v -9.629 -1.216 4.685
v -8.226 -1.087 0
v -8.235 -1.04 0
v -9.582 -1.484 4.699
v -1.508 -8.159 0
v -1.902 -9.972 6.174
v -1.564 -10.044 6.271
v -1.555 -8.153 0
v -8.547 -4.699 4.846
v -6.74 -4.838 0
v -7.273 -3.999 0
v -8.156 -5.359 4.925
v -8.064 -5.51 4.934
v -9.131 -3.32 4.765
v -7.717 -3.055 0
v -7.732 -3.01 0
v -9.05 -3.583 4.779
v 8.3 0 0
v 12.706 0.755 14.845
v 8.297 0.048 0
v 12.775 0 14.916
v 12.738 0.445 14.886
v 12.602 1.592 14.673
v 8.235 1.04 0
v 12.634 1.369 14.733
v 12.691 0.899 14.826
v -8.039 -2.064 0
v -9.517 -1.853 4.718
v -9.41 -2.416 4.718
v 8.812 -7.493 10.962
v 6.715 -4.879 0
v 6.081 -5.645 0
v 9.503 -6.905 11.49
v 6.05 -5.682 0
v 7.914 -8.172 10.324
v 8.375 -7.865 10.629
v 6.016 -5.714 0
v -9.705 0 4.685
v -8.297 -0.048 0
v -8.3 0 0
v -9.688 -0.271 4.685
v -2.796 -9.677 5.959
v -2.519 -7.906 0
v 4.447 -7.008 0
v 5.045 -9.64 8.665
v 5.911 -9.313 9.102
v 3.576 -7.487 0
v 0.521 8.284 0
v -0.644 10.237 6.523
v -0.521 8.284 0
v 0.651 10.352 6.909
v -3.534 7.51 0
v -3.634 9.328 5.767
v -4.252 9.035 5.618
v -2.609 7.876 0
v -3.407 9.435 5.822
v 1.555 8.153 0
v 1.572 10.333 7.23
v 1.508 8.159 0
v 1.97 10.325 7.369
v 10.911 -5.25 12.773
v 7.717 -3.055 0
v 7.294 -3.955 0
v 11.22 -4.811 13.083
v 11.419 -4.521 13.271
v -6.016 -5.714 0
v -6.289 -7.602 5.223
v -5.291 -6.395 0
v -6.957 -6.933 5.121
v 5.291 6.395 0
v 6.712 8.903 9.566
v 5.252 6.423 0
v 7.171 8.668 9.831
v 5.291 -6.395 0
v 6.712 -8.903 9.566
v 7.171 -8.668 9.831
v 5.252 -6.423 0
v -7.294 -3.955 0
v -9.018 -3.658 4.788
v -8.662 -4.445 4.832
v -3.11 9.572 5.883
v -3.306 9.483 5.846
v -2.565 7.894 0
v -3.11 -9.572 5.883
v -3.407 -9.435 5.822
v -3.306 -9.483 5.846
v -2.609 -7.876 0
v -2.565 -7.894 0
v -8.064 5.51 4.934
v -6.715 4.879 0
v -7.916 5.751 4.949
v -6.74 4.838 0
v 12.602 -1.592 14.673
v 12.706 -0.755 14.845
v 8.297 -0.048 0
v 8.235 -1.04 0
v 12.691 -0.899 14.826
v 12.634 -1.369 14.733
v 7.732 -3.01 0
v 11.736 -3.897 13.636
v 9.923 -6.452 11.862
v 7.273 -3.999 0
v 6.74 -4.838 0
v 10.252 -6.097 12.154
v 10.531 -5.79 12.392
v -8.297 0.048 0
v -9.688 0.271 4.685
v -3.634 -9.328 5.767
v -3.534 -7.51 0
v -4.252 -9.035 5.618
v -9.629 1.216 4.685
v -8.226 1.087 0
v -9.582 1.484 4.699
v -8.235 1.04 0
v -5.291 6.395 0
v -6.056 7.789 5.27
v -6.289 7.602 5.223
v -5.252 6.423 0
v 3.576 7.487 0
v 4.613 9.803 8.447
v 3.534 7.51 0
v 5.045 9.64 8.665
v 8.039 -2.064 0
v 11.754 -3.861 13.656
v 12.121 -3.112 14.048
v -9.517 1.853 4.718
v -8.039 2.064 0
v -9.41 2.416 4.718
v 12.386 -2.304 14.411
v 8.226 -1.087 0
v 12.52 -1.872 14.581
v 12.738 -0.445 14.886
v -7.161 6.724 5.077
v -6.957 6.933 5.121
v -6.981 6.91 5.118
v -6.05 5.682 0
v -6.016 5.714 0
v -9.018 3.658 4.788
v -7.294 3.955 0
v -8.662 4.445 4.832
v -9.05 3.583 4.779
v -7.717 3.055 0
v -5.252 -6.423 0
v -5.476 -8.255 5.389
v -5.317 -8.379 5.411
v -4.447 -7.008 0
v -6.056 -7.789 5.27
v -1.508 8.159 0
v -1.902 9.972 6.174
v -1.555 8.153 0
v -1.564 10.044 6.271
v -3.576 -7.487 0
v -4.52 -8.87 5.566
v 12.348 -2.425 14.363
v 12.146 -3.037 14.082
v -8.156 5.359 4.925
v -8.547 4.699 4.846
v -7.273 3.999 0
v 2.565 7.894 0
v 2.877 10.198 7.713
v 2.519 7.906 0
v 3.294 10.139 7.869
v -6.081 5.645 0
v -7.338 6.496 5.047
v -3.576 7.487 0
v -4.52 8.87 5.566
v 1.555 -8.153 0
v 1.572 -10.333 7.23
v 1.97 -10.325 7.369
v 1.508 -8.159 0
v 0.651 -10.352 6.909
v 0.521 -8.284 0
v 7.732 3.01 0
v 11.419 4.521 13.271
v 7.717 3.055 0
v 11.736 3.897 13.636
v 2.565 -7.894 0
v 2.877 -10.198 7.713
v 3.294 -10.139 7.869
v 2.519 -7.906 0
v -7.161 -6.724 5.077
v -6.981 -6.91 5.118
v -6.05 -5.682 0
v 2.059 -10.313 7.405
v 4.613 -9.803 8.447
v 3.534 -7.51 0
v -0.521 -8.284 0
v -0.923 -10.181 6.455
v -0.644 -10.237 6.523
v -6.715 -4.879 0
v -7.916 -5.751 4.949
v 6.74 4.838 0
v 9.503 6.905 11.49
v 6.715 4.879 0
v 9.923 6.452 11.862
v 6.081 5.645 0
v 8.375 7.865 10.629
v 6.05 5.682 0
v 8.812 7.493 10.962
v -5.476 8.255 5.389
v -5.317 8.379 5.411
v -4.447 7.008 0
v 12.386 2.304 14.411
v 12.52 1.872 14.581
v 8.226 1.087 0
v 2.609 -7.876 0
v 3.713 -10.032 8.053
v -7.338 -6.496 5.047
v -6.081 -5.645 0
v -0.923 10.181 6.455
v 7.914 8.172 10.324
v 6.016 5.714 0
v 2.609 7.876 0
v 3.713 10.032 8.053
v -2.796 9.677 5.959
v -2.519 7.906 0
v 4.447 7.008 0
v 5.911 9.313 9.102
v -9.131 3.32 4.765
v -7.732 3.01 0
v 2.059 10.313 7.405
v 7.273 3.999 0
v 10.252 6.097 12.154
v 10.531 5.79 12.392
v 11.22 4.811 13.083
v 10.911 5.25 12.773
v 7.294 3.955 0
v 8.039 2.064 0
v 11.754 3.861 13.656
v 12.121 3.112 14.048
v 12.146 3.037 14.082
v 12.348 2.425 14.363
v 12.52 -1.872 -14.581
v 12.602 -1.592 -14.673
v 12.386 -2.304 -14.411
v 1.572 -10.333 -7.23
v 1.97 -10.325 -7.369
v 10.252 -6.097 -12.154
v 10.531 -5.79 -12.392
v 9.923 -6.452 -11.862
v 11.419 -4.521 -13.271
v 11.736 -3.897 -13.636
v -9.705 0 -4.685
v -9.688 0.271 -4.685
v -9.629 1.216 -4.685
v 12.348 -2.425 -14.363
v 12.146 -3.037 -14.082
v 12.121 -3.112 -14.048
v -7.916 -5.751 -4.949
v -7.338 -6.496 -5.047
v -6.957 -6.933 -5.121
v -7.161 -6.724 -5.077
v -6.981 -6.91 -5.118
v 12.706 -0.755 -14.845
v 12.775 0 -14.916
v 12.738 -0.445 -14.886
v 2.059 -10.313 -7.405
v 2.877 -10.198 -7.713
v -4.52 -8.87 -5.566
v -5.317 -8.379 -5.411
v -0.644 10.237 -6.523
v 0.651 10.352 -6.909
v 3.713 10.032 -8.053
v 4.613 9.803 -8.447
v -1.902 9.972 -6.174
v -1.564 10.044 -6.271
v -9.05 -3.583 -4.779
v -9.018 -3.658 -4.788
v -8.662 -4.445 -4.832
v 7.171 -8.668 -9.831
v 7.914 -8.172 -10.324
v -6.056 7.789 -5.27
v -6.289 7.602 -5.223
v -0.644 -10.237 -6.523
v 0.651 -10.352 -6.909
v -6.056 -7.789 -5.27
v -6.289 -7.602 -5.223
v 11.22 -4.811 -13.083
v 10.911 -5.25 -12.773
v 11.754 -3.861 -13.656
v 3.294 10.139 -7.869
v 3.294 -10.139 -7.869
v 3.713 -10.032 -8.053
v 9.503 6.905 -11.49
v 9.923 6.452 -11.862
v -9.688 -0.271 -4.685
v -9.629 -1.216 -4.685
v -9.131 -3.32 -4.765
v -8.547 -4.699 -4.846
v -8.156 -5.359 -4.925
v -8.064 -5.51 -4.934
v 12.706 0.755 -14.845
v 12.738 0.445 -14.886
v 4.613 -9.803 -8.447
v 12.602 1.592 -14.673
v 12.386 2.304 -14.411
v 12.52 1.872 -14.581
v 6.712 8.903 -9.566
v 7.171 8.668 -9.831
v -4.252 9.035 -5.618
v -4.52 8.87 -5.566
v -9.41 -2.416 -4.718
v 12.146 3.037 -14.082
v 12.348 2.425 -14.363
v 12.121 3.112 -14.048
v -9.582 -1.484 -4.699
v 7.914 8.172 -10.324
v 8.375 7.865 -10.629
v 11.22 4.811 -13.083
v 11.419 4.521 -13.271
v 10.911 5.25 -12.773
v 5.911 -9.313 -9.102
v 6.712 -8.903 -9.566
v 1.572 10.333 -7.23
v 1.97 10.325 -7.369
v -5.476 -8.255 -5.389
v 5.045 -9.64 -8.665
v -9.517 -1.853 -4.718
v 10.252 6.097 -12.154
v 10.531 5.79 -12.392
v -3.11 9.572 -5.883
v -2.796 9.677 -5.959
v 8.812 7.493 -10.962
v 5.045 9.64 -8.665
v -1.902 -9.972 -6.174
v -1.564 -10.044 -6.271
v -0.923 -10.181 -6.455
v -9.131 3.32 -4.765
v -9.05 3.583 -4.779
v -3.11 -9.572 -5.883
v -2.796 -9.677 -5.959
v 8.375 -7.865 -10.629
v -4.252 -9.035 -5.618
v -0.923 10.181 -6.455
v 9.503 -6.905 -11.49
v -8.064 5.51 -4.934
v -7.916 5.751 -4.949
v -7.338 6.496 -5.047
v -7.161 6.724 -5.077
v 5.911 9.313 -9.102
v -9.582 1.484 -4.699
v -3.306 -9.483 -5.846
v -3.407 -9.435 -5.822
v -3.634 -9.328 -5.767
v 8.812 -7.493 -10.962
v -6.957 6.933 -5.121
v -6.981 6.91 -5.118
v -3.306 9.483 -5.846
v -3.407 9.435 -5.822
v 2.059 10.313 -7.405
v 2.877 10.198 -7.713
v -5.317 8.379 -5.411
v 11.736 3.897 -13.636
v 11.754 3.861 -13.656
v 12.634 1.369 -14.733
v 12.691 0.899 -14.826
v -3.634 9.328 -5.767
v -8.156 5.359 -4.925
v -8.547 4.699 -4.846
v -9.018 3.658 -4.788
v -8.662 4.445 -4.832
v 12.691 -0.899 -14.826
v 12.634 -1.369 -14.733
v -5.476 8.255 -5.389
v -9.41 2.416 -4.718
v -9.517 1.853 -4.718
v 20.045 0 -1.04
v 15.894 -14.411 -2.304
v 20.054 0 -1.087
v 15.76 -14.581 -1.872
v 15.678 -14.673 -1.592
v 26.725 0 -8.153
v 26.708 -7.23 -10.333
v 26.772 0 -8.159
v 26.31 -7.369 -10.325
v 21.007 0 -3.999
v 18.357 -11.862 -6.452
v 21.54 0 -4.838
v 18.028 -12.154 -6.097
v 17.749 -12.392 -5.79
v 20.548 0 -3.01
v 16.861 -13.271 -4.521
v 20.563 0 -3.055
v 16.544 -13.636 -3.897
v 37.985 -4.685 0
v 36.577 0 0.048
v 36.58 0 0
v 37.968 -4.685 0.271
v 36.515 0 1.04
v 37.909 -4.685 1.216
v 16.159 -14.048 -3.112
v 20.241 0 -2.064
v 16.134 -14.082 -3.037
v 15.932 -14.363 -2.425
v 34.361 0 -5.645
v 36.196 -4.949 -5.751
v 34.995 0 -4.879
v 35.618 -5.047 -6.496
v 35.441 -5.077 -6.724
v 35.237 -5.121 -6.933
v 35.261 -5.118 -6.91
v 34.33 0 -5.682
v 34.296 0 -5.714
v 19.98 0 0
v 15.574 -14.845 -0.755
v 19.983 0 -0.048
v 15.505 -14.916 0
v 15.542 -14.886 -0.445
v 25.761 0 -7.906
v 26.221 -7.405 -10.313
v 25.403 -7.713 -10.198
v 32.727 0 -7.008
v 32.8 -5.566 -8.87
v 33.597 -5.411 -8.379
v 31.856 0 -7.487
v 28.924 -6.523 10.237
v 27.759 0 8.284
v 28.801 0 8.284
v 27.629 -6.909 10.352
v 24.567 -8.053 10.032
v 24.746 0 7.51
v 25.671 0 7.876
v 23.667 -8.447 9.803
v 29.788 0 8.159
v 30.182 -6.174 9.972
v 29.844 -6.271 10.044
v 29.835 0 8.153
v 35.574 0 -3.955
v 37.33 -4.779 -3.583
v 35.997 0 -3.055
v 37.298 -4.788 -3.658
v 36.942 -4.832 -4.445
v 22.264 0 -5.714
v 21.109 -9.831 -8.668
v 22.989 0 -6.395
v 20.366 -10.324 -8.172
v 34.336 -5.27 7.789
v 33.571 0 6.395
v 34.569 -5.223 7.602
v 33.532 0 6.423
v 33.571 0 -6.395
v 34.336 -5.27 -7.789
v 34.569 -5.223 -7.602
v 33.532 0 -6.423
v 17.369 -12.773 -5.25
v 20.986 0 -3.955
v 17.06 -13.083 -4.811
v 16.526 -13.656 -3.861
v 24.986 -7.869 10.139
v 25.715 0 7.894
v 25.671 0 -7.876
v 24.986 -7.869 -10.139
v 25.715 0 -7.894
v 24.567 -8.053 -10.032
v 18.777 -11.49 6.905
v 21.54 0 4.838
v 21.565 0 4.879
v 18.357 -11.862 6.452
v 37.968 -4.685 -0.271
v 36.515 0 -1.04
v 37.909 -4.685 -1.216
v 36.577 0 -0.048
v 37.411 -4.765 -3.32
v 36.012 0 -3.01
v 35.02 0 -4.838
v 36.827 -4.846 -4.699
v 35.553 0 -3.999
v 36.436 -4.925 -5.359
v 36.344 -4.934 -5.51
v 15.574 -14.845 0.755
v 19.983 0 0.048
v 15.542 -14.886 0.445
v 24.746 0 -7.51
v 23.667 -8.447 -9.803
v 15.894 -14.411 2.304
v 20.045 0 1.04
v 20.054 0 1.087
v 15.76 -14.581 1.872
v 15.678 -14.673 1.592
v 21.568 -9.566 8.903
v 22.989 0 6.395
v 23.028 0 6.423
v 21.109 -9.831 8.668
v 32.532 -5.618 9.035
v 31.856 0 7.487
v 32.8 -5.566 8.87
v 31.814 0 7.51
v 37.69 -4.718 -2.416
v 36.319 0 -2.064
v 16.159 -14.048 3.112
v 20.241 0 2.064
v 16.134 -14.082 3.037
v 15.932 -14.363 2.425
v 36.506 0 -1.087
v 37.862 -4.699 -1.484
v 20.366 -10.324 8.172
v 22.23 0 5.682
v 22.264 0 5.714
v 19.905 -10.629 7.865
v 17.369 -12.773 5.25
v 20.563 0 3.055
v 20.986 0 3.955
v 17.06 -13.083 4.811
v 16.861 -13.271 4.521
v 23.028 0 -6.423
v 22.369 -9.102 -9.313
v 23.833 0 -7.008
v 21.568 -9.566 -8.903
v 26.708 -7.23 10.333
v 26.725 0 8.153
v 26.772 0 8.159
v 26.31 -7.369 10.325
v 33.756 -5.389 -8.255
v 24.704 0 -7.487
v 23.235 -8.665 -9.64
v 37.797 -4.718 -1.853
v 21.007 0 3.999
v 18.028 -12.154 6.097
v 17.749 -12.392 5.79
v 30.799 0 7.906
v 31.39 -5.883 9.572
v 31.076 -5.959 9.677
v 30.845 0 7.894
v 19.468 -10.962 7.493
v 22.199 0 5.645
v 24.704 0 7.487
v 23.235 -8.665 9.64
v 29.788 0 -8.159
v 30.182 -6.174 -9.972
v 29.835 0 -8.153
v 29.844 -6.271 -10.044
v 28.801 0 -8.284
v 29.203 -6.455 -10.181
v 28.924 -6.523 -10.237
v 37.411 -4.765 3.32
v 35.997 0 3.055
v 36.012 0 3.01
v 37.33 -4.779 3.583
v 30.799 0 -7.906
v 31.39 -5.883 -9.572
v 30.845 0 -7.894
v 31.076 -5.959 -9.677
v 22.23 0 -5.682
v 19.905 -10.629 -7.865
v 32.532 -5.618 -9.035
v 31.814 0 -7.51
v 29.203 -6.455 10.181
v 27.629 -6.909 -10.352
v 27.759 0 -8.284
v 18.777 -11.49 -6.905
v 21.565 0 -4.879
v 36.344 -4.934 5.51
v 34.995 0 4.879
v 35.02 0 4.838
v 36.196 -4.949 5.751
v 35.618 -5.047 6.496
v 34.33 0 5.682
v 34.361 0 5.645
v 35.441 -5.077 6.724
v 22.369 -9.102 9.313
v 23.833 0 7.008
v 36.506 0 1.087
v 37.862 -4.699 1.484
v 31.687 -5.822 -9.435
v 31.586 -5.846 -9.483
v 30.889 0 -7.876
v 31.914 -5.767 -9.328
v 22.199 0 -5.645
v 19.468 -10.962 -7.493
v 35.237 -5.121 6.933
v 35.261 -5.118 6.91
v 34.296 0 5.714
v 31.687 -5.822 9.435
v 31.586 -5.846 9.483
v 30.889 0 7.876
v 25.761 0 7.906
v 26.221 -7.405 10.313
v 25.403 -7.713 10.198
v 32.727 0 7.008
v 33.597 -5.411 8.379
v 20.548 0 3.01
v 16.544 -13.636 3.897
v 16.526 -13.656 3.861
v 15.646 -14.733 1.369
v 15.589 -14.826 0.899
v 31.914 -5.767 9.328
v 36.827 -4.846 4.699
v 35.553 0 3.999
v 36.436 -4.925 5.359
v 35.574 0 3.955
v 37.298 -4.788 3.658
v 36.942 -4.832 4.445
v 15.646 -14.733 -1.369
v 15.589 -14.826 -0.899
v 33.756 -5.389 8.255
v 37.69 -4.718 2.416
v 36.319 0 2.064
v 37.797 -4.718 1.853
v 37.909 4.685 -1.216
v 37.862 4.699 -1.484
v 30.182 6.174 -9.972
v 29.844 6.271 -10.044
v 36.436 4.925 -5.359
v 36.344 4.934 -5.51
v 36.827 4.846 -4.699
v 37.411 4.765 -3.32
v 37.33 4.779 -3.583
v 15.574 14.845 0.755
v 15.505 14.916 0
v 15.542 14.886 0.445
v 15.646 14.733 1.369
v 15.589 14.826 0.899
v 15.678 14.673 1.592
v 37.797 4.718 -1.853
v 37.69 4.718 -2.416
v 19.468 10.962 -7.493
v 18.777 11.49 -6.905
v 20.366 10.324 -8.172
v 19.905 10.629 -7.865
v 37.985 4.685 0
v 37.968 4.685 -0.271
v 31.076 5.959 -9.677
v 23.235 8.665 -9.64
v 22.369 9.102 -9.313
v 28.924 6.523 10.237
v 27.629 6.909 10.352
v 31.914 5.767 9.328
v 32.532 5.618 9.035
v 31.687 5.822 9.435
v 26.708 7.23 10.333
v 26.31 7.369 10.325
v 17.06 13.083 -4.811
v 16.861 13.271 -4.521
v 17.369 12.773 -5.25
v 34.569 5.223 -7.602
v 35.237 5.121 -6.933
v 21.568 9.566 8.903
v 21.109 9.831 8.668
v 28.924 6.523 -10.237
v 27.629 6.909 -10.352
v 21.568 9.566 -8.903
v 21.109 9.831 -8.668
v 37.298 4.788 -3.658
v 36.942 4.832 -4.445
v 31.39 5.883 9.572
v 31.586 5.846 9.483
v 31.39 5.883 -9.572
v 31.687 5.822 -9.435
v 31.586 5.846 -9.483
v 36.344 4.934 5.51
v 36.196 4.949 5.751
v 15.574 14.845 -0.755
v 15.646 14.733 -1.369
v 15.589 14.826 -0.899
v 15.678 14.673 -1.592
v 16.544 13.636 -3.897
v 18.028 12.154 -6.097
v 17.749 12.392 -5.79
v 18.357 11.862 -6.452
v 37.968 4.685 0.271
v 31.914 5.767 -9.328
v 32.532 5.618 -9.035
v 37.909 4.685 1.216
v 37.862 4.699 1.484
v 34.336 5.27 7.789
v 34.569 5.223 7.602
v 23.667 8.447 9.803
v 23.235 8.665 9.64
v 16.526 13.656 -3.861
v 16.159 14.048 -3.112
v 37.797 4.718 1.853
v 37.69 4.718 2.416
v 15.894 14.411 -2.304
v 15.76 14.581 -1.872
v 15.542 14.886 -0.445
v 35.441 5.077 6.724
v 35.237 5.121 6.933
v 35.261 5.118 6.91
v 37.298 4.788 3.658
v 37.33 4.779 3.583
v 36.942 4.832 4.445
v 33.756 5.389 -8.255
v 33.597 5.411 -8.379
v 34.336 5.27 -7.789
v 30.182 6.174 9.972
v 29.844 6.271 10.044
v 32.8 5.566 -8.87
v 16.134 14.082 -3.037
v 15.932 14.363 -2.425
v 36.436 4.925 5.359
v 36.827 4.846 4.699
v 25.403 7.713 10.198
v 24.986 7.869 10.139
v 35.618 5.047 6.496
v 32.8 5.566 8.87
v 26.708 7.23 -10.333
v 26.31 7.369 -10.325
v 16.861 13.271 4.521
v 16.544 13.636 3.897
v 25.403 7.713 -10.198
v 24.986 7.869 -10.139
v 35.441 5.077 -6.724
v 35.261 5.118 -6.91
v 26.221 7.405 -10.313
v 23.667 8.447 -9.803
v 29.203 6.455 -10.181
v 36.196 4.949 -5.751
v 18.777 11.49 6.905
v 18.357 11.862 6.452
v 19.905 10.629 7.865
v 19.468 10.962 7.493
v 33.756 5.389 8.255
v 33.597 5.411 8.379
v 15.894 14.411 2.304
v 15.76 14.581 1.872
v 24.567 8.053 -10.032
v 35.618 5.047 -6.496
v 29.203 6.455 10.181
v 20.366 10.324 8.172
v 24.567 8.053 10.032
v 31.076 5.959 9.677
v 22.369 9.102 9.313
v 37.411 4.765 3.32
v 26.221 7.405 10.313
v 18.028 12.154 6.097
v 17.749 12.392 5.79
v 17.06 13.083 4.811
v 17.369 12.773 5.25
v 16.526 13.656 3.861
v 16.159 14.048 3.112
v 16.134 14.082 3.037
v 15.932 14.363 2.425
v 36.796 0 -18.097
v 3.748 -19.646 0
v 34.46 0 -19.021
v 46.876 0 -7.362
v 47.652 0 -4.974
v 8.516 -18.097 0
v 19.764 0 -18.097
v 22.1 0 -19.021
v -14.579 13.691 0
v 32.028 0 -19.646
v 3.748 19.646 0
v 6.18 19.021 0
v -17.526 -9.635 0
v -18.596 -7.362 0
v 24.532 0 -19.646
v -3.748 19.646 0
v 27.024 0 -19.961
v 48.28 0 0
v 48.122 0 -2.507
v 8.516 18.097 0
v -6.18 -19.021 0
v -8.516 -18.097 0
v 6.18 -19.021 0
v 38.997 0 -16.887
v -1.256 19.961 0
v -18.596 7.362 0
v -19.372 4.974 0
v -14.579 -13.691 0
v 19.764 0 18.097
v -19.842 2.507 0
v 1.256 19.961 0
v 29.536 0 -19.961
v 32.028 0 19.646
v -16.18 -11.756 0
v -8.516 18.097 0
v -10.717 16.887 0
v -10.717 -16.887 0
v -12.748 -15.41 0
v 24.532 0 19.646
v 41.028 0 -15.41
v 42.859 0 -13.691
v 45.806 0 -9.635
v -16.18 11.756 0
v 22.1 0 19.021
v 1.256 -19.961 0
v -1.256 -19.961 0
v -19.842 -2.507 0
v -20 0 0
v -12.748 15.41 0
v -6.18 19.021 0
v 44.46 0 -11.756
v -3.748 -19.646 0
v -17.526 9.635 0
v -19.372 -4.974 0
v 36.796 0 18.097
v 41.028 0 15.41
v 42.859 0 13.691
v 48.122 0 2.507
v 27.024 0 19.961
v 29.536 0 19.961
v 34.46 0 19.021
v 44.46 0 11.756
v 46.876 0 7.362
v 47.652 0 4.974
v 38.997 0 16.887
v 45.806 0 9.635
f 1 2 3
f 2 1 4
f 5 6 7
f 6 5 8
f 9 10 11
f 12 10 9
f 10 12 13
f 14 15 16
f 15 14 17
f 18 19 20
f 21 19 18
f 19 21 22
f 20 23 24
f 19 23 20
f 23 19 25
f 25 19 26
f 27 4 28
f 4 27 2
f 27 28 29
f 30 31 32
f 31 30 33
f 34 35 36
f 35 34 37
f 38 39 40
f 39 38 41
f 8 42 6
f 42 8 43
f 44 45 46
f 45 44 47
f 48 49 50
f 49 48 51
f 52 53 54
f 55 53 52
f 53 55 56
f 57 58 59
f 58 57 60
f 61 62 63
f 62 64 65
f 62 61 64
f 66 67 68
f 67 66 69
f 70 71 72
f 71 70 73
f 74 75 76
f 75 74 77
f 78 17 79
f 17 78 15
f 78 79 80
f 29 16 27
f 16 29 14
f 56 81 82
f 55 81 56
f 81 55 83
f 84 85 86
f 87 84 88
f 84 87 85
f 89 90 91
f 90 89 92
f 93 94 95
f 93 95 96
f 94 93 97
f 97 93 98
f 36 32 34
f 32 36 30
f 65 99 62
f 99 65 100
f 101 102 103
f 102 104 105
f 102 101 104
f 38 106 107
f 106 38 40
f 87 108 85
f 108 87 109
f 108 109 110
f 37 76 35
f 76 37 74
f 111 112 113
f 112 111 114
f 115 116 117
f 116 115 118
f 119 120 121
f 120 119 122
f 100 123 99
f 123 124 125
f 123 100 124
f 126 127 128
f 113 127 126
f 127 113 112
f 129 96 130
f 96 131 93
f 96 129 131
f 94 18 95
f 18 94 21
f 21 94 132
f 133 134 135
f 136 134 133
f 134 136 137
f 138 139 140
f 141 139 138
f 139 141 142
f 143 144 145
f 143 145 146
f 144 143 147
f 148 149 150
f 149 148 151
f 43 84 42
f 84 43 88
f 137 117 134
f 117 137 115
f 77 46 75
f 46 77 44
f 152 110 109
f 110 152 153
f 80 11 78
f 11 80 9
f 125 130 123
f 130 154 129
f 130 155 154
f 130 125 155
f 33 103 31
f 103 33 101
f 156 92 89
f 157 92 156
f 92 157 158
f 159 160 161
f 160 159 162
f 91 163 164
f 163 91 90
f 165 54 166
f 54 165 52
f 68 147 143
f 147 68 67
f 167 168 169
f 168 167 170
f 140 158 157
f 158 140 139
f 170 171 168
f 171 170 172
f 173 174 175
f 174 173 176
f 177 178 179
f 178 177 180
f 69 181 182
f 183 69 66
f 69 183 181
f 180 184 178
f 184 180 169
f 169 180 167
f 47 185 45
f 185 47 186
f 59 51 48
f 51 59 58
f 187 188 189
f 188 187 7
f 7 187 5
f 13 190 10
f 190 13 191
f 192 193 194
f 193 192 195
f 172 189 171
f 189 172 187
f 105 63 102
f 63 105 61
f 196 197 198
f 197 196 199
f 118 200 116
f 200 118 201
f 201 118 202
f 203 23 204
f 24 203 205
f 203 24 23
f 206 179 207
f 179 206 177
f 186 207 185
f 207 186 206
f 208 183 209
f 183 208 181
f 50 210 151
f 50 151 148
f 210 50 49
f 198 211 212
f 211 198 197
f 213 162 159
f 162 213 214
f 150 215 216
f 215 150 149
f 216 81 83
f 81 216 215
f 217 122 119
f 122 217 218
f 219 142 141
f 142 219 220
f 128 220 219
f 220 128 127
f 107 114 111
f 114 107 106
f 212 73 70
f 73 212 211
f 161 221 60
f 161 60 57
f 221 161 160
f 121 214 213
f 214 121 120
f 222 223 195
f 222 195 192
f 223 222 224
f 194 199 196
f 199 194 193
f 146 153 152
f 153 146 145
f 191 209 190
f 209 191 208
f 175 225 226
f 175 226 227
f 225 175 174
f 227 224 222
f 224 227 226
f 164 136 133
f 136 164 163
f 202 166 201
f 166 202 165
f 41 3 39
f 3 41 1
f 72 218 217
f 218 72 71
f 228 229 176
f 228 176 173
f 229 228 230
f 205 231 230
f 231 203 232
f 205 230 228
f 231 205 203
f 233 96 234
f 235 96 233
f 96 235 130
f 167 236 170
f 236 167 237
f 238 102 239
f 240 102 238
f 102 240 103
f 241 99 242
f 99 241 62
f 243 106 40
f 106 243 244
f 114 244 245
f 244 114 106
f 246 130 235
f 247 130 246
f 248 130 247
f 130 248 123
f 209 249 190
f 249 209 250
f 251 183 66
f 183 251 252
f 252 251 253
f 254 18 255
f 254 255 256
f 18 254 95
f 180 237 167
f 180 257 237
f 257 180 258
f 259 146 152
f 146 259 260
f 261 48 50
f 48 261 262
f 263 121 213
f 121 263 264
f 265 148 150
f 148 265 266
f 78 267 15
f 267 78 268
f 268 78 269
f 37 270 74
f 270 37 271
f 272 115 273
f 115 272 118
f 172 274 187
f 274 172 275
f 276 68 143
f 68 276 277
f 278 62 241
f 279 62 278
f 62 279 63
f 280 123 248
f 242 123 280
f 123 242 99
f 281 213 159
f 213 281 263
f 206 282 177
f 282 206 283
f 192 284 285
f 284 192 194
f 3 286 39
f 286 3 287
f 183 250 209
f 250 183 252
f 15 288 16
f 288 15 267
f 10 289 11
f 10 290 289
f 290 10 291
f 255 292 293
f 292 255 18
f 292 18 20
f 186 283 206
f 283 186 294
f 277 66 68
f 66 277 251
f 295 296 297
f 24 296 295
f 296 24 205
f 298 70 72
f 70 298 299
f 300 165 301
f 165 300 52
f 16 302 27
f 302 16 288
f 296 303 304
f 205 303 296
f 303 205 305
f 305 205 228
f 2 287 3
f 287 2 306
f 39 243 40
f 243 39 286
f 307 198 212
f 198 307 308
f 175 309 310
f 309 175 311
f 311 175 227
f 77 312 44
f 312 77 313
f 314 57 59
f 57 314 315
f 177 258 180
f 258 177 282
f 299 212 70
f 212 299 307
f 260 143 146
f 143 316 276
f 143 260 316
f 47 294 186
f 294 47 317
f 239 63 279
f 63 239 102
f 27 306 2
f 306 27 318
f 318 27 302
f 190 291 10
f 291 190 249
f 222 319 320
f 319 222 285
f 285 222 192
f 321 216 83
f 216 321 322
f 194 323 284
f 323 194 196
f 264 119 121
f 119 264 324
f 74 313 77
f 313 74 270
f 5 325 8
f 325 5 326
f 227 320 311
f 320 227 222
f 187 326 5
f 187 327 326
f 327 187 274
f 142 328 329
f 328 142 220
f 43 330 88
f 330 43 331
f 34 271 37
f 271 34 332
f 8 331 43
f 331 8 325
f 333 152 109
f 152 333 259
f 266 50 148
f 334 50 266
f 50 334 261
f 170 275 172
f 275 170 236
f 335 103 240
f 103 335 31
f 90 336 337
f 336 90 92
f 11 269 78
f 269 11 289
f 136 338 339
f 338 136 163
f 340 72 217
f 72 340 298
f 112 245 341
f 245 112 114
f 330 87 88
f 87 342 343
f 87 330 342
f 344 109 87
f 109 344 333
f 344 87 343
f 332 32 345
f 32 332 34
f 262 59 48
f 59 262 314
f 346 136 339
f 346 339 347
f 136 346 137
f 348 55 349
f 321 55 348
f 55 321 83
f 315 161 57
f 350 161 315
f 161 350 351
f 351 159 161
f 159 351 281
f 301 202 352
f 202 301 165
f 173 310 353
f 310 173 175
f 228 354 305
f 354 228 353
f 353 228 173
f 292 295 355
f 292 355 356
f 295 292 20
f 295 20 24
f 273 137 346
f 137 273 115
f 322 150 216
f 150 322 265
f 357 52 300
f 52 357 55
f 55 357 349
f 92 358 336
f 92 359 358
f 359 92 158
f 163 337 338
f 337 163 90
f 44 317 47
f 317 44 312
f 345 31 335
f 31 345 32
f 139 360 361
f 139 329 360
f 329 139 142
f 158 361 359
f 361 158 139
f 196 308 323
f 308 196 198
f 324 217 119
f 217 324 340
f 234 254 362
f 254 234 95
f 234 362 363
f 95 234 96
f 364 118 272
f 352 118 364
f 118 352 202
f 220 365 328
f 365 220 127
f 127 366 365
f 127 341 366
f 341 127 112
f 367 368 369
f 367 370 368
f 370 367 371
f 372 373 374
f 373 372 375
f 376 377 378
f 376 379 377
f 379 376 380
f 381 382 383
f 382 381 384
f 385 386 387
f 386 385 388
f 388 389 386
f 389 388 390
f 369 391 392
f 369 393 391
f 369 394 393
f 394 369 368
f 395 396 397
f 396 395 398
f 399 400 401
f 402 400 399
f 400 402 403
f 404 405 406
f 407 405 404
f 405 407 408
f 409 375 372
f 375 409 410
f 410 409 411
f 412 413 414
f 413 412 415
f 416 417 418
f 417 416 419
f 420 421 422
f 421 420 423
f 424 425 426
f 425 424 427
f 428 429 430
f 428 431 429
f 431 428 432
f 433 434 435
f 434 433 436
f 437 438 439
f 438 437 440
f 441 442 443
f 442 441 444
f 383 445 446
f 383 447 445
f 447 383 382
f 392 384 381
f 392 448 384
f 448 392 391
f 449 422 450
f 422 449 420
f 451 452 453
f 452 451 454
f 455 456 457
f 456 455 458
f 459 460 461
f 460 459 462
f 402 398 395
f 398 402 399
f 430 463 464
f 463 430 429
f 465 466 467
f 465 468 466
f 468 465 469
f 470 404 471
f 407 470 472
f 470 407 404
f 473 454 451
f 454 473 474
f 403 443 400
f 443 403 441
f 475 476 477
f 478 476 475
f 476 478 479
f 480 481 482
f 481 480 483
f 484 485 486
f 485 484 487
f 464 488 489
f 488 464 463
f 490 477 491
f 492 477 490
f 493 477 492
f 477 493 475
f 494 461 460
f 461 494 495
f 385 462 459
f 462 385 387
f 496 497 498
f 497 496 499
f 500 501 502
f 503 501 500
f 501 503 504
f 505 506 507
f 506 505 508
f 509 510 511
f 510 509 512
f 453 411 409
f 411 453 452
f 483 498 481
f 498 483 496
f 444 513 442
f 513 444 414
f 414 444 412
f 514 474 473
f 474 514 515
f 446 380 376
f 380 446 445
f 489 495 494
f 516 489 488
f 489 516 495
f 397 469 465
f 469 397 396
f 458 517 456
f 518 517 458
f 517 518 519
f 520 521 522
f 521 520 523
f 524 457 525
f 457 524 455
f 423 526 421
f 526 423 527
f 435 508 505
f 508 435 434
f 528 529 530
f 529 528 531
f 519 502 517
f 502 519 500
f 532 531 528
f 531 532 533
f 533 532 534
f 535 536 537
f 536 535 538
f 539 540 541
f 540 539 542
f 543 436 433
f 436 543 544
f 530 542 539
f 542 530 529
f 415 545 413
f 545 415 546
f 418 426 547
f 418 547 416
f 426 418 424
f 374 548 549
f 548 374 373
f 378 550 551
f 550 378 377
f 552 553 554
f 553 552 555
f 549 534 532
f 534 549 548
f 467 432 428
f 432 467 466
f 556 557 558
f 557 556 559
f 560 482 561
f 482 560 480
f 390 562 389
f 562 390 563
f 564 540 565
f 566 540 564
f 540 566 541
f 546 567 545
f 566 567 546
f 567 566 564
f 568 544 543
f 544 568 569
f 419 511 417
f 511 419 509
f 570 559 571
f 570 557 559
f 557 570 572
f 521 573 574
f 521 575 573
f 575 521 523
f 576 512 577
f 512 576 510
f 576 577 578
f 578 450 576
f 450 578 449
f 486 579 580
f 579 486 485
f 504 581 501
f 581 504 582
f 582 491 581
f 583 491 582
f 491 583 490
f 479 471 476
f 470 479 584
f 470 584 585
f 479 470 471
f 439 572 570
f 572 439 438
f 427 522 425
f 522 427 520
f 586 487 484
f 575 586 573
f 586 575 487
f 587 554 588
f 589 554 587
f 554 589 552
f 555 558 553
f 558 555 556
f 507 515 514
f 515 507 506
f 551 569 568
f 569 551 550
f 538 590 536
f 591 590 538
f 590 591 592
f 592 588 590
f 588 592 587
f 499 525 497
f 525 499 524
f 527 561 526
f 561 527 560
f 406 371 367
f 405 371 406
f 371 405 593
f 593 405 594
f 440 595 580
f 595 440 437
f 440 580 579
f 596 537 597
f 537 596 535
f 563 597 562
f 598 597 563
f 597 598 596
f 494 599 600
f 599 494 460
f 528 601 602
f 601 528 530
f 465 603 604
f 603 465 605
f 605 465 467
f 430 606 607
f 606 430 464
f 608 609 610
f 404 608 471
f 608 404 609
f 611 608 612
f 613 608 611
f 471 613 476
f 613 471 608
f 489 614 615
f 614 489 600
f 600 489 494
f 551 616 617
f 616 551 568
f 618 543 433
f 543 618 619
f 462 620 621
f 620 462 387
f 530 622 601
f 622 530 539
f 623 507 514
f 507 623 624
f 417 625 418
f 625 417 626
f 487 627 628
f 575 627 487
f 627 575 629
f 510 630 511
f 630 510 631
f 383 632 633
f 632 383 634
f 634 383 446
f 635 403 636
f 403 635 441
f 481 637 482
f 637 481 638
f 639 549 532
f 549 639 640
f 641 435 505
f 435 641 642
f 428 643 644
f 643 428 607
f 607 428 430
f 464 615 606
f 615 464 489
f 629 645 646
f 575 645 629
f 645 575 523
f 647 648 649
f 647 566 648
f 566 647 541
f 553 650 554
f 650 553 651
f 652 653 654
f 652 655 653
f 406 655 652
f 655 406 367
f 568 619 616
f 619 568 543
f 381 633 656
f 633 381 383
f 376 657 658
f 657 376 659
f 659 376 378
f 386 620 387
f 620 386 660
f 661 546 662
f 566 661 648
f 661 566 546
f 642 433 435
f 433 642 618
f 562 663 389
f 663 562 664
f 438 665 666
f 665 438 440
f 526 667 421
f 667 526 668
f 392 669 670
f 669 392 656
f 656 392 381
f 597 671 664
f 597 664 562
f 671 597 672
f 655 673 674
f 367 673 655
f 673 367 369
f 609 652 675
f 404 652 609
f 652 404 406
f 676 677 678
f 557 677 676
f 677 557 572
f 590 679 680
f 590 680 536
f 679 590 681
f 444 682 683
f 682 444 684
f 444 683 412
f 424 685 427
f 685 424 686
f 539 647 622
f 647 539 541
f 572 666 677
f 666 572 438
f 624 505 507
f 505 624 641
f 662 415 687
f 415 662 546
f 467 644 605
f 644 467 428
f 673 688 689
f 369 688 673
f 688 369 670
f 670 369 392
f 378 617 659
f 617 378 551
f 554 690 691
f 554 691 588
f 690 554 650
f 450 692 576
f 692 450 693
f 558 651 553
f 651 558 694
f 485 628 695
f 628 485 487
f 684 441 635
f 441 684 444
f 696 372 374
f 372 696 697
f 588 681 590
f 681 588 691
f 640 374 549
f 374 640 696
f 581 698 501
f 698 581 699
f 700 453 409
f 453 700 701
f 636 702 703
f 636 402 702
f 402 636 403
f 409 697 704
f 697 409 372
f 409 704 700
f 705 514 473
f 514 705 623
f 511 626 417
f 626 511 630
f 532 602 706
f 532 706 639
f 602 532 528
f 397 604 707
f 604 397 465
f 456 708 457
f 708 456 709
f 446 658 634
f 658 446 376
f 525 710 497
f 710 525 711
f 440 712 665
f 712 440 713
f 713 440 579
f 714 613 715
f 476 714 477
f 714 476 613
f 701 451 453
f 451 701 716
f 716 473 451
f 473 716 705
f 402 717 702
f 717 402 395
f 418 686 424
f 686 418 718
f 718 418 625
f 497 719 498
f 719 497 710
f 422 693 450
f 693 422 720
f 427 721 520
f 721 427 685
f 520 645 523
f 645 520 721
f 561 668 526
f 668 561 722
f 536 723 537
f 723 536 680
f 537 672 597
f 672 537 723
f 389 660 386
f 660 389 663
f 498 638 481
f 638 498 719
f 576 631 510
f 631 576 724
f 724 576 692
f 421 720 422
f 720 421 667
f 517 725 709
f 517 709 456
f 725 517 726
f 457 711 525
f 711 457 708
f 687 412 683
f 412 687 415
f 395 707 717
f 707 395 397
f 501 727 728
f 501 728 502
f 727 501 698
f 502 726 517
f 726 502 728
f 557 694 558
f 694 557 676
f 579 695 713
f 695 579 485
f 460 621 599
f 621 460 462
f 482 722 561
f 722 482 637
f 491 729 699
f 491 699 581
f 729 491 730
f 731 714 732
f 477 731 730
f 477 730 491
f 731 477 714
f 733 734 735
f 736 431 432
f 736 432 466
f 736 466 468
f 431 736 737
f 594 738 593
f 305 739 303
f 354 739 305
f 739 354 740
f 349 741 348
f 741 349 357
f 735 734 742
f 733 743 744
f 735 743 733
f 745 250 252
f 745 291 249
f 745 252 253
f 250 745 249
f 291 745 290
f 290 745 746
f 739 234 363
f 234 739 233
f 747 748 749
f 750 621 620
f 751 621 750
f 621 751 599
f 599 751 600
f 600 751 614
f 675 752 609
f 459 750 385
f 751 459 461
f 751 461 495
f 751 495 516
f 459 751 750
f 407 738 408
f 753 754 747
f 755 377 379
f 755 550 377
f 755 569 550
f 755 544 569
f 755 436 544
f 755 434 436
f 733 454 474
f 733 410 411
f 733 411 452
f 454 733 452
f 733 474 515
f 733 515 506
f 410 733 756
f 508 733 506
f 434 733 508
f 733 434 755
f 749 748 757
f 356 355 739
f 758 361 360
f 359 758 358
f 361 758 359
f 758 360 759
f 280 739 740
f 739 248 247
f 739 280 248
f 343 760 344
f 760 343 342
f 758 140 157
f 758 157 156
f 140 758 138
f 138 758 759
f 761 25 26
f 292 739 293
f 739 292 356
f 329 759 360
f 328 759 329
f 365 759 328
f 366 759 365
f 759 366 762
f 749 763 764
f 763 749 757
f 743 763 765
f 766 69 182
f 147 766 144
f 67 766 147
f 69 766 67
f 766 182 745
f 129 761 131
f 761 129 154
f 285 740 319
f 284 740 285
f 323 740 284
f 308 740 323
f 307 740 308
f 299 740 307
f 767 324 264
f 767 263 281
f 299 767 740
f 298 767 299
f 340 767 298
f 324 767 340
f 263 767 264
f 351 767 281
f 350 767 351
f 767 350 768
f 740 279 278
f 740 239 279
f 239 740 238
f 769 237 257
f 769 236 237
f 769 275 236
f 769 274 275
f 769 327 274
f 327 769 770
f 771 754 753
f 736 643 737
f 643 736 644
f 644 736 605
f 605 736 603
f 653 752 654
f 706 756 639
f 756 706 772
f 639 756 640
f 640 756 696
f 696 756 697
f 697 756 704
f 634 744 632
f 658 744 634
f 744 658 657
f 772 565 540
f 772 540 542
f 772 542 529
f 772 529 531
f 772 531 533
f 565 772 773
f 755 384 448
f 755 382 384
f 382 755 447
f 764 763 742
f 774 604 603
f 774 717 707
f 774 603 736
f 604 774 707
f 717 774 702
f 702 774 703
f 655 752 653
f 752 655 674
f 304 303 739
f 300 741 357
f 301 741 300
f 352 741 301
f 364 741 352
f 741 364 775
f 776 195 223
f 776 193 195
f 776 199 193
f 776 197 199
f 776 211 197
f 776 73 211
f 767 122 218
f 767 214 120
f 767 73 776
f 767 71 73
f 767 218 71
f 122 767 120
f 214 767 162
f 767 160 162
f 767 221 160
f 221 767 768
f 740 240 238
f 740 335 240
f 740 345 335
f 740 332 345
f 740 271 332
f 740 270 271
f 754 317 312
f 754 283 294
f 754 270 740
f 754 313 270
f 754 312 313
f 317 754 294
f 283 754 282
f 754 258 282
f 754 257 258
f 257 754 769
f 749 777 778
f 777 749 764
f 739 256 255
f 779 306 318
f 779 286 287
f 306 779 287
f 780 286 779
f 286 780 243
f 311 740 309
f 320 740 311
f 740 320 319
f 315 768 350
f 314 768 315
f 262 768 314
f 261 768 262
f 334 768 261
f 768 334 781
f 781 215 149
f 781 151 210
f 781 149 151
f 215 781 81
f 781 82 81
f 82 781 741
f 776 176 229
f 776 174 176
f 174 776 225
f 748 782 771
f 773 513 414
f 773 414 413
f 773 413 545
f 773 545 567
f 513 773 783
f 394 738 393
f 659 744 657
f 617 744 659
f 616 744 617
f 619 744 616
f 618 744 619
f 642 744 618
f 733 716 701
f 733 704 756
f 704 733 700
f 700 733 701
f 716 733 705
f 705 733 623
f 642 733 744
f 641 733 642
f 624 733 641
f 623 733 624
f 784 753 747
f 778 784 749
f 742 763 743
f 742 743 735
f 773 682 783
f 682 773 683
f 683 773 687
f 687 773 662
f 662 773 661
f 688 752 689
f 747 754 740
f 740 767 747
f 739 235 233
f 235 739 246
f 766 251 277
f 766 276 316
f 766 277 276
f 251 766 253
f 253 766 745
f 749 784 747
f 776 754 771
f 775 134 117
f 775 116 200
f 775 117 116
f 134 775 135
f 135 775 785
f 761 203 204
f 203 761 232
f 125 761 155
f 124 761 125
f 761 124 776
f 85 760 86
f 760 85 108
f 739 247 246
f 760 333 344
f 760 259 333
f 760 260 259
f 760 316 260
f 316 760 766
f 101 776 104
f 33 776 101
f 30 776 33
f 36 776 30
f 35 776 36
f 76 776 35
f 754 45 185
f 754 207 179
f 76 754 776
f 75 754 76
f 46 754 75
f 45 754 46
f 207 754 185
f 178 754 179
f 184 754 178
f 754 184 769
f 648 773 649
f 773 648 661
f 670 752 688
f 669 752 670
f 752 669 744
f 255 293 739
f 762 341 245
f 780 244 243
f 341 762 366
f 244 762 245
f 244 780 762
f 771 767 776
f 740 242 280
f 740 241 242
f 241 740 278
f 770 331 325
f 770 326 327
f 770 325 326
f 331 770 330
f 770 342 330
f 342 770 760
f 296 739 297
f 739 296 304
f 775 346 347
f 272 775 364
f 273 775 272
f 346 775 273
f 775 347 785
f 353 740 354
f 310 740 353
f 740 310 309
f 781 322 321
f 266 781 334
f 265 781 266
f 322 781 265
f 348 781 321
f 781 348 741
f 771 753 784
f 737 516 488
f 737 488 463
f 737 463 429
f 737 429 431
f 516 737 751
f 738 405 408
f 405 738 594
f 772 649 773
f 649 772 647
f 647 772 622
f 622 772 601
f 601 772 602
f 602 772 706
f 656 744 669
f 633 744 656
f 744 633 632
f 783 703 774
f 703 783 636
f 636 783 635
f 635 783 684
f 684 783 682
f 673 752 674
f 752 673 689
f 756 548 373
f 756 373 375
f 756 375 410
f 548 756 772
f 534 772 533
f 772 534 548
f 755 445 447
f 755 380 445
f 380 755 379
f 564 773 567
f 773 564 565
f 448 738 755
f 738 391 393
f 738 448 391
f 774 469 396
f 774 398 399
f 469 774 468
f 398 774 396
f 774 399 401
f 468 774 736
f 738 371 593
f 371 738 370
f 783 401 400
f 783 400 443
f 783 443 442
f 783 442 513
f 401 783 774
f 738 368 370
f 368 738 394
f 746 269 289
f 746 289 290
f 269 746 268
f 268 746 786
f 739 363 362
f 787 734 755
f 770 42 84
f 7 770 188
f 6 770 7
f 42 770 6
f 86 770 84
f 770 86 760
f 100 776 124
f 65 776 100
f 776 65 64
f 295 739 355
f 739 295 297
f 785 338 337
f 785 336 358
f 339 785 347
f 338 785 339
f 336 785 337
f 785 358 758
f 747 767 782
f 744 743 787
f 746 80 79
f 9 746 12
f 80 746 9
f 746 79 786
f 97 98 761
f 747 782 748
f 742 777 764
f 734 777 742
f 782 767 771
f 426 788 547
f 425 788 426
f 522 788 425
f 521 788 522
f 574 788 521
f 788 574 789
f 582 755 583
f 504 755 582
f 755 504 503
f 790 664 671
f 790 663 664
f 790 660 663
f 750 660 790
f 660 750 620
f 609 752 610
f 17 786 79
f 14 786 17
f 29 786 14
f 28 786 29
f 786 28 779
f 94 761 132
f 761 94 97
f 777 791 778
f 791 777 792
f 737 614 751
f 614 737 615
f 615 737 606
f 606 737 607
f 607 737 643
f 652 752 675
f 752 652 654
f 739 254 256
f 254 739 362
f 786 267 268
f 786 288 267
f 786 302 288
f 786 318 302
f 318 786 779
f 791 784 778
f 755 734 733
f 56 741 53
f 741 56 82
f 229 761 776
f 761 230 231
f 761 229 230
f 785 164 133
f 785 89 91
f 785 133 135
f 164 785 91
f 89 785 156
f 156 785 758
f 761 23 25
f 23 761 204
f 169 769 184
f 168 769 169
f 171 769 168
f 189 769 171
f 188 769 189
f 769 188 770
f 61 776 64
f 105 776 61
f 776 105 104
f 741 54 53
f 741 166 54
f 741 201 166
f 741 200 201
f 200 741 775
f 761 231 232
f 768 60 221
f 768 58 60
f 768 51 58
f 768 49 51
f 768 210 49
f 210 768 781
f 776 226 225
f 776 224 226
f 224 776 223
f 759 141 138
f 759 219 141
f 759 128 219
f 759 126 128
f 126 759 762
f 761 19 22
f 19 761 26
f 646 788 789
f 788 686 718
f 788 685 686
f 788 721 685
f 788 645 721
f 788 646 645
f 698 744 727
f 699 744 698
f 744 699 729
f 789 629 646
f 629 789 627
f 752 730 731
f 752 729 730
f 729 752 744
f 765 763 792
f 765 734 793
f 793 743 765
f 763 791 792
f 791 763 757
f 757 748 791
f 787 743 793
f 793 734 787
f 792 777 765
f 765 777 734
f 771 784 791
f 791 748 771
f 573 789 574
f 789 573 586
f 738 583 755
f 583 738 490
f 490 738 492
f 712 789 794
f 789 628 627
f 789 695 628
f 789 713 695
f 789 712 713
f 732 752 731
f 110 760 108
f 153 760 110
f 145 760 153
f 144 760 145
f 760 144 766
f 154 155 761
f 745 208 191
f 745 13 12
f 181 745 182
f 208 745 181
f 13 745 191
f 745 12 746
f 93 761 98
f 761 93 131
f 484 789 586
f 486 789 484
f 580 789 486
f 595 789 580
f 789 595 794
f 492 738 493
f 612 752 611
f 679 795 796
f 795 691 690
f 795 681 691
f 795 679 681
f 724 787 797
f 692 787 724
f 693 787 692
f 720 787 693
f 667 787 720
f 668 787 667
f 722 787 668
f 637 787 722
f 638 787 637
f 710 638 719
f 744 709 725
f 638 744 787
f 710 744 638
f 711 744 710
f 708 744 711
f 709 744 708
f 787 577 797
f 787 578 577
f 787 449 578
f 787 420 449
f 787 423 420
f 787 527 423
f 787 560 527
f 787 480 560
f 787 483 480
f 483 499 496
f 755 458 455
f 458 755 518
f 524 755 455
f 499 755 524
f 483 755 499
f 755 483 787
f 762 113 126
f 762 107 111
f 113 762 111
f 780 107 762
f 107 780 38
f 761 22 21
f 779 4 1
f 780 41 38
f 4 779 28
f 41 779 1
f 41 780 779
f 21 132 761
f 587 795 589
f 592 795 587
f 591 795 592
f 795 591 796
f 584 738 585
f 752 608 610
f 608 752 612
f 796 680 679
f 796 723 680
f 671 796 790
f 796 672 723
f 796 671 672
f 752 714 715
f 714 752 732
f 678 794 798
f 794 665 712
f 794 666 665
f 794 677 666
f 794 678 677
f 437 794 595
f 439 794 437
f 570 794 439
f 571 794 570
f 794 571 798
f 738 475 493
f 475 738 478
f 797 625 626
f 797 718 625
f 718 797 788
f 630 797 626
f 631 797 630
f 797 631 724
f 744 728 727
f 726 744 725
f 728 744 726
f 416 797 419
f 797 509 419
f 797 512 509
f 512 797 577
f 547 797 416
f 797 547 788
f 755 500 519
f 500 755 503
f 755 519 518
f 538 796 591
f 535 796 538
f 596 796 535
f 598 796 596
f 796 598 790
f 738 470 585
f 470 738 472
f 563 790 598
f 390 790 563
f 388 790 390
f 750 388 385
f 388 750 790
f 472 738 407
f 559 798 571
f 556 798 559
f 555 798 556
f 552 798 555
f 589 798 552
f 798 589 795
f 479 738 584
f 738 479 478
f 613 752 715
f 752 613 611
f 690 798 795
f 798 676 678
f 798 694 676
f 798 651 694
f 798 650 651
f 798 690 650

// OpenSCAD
// half or full oloid
form = "full";  // [half, full ]
// radius of one circle
radius=20;
// radius of hole - 0 for solid
hole_radius=8; 
// % slope of hole
hole_slope= 30; 
// offset ratio - 1 for true oloid, 1.414 (sqrt(2)for 2 circle roller
offset_ratio =  1.414;



module d(r) {
  cylinder(r1=r,r2=0,h=eps);
}

module disk(r){
  d(r);rotate([0,180,0]) d(r);
}

module hole(r,slope) {
   translate([0,0,-1]) cylinder(r1=r,r2=r+slope,h=100);
   rotate([0,180,0])
      translate([0,0,-1]) cylinder(r1=r,r2=r+slope,h=100);
};

module oloid(radius,offset_ratio,hole_radius,hole_slope){
  difference() {
     hull(){
      disk(radius);
      rotate([90,00,0]) translate([radius*offset_ratio,0,0]) 
         disk(radius);
     }
     hole(hole_radius,hole_slope);
     rotate([90,00,0]) translate([radius*offset_ratio,0,0])
        hole(hole_radius,hole_slope);
 }
}
module ground() {
   translate([0,0,-100]) cube([200,200,200], center=true);

}

module ruler(n) {
   for (i=[0:n-1]) 
       translate([(i-n/2 +0.5)* 10,0,0]) cube([9.8,5,2], center=true);
}

eps=0.1;
$fn=50;

if (form =="half") 
     difference() {
       oloid(radius,offset_ratio,hole_radius,hole_slope);
       ground();
    }
else   
     oloid(radius,offset_ratio,hole_radius,hole_slope);
 
 

*ruler(10);
